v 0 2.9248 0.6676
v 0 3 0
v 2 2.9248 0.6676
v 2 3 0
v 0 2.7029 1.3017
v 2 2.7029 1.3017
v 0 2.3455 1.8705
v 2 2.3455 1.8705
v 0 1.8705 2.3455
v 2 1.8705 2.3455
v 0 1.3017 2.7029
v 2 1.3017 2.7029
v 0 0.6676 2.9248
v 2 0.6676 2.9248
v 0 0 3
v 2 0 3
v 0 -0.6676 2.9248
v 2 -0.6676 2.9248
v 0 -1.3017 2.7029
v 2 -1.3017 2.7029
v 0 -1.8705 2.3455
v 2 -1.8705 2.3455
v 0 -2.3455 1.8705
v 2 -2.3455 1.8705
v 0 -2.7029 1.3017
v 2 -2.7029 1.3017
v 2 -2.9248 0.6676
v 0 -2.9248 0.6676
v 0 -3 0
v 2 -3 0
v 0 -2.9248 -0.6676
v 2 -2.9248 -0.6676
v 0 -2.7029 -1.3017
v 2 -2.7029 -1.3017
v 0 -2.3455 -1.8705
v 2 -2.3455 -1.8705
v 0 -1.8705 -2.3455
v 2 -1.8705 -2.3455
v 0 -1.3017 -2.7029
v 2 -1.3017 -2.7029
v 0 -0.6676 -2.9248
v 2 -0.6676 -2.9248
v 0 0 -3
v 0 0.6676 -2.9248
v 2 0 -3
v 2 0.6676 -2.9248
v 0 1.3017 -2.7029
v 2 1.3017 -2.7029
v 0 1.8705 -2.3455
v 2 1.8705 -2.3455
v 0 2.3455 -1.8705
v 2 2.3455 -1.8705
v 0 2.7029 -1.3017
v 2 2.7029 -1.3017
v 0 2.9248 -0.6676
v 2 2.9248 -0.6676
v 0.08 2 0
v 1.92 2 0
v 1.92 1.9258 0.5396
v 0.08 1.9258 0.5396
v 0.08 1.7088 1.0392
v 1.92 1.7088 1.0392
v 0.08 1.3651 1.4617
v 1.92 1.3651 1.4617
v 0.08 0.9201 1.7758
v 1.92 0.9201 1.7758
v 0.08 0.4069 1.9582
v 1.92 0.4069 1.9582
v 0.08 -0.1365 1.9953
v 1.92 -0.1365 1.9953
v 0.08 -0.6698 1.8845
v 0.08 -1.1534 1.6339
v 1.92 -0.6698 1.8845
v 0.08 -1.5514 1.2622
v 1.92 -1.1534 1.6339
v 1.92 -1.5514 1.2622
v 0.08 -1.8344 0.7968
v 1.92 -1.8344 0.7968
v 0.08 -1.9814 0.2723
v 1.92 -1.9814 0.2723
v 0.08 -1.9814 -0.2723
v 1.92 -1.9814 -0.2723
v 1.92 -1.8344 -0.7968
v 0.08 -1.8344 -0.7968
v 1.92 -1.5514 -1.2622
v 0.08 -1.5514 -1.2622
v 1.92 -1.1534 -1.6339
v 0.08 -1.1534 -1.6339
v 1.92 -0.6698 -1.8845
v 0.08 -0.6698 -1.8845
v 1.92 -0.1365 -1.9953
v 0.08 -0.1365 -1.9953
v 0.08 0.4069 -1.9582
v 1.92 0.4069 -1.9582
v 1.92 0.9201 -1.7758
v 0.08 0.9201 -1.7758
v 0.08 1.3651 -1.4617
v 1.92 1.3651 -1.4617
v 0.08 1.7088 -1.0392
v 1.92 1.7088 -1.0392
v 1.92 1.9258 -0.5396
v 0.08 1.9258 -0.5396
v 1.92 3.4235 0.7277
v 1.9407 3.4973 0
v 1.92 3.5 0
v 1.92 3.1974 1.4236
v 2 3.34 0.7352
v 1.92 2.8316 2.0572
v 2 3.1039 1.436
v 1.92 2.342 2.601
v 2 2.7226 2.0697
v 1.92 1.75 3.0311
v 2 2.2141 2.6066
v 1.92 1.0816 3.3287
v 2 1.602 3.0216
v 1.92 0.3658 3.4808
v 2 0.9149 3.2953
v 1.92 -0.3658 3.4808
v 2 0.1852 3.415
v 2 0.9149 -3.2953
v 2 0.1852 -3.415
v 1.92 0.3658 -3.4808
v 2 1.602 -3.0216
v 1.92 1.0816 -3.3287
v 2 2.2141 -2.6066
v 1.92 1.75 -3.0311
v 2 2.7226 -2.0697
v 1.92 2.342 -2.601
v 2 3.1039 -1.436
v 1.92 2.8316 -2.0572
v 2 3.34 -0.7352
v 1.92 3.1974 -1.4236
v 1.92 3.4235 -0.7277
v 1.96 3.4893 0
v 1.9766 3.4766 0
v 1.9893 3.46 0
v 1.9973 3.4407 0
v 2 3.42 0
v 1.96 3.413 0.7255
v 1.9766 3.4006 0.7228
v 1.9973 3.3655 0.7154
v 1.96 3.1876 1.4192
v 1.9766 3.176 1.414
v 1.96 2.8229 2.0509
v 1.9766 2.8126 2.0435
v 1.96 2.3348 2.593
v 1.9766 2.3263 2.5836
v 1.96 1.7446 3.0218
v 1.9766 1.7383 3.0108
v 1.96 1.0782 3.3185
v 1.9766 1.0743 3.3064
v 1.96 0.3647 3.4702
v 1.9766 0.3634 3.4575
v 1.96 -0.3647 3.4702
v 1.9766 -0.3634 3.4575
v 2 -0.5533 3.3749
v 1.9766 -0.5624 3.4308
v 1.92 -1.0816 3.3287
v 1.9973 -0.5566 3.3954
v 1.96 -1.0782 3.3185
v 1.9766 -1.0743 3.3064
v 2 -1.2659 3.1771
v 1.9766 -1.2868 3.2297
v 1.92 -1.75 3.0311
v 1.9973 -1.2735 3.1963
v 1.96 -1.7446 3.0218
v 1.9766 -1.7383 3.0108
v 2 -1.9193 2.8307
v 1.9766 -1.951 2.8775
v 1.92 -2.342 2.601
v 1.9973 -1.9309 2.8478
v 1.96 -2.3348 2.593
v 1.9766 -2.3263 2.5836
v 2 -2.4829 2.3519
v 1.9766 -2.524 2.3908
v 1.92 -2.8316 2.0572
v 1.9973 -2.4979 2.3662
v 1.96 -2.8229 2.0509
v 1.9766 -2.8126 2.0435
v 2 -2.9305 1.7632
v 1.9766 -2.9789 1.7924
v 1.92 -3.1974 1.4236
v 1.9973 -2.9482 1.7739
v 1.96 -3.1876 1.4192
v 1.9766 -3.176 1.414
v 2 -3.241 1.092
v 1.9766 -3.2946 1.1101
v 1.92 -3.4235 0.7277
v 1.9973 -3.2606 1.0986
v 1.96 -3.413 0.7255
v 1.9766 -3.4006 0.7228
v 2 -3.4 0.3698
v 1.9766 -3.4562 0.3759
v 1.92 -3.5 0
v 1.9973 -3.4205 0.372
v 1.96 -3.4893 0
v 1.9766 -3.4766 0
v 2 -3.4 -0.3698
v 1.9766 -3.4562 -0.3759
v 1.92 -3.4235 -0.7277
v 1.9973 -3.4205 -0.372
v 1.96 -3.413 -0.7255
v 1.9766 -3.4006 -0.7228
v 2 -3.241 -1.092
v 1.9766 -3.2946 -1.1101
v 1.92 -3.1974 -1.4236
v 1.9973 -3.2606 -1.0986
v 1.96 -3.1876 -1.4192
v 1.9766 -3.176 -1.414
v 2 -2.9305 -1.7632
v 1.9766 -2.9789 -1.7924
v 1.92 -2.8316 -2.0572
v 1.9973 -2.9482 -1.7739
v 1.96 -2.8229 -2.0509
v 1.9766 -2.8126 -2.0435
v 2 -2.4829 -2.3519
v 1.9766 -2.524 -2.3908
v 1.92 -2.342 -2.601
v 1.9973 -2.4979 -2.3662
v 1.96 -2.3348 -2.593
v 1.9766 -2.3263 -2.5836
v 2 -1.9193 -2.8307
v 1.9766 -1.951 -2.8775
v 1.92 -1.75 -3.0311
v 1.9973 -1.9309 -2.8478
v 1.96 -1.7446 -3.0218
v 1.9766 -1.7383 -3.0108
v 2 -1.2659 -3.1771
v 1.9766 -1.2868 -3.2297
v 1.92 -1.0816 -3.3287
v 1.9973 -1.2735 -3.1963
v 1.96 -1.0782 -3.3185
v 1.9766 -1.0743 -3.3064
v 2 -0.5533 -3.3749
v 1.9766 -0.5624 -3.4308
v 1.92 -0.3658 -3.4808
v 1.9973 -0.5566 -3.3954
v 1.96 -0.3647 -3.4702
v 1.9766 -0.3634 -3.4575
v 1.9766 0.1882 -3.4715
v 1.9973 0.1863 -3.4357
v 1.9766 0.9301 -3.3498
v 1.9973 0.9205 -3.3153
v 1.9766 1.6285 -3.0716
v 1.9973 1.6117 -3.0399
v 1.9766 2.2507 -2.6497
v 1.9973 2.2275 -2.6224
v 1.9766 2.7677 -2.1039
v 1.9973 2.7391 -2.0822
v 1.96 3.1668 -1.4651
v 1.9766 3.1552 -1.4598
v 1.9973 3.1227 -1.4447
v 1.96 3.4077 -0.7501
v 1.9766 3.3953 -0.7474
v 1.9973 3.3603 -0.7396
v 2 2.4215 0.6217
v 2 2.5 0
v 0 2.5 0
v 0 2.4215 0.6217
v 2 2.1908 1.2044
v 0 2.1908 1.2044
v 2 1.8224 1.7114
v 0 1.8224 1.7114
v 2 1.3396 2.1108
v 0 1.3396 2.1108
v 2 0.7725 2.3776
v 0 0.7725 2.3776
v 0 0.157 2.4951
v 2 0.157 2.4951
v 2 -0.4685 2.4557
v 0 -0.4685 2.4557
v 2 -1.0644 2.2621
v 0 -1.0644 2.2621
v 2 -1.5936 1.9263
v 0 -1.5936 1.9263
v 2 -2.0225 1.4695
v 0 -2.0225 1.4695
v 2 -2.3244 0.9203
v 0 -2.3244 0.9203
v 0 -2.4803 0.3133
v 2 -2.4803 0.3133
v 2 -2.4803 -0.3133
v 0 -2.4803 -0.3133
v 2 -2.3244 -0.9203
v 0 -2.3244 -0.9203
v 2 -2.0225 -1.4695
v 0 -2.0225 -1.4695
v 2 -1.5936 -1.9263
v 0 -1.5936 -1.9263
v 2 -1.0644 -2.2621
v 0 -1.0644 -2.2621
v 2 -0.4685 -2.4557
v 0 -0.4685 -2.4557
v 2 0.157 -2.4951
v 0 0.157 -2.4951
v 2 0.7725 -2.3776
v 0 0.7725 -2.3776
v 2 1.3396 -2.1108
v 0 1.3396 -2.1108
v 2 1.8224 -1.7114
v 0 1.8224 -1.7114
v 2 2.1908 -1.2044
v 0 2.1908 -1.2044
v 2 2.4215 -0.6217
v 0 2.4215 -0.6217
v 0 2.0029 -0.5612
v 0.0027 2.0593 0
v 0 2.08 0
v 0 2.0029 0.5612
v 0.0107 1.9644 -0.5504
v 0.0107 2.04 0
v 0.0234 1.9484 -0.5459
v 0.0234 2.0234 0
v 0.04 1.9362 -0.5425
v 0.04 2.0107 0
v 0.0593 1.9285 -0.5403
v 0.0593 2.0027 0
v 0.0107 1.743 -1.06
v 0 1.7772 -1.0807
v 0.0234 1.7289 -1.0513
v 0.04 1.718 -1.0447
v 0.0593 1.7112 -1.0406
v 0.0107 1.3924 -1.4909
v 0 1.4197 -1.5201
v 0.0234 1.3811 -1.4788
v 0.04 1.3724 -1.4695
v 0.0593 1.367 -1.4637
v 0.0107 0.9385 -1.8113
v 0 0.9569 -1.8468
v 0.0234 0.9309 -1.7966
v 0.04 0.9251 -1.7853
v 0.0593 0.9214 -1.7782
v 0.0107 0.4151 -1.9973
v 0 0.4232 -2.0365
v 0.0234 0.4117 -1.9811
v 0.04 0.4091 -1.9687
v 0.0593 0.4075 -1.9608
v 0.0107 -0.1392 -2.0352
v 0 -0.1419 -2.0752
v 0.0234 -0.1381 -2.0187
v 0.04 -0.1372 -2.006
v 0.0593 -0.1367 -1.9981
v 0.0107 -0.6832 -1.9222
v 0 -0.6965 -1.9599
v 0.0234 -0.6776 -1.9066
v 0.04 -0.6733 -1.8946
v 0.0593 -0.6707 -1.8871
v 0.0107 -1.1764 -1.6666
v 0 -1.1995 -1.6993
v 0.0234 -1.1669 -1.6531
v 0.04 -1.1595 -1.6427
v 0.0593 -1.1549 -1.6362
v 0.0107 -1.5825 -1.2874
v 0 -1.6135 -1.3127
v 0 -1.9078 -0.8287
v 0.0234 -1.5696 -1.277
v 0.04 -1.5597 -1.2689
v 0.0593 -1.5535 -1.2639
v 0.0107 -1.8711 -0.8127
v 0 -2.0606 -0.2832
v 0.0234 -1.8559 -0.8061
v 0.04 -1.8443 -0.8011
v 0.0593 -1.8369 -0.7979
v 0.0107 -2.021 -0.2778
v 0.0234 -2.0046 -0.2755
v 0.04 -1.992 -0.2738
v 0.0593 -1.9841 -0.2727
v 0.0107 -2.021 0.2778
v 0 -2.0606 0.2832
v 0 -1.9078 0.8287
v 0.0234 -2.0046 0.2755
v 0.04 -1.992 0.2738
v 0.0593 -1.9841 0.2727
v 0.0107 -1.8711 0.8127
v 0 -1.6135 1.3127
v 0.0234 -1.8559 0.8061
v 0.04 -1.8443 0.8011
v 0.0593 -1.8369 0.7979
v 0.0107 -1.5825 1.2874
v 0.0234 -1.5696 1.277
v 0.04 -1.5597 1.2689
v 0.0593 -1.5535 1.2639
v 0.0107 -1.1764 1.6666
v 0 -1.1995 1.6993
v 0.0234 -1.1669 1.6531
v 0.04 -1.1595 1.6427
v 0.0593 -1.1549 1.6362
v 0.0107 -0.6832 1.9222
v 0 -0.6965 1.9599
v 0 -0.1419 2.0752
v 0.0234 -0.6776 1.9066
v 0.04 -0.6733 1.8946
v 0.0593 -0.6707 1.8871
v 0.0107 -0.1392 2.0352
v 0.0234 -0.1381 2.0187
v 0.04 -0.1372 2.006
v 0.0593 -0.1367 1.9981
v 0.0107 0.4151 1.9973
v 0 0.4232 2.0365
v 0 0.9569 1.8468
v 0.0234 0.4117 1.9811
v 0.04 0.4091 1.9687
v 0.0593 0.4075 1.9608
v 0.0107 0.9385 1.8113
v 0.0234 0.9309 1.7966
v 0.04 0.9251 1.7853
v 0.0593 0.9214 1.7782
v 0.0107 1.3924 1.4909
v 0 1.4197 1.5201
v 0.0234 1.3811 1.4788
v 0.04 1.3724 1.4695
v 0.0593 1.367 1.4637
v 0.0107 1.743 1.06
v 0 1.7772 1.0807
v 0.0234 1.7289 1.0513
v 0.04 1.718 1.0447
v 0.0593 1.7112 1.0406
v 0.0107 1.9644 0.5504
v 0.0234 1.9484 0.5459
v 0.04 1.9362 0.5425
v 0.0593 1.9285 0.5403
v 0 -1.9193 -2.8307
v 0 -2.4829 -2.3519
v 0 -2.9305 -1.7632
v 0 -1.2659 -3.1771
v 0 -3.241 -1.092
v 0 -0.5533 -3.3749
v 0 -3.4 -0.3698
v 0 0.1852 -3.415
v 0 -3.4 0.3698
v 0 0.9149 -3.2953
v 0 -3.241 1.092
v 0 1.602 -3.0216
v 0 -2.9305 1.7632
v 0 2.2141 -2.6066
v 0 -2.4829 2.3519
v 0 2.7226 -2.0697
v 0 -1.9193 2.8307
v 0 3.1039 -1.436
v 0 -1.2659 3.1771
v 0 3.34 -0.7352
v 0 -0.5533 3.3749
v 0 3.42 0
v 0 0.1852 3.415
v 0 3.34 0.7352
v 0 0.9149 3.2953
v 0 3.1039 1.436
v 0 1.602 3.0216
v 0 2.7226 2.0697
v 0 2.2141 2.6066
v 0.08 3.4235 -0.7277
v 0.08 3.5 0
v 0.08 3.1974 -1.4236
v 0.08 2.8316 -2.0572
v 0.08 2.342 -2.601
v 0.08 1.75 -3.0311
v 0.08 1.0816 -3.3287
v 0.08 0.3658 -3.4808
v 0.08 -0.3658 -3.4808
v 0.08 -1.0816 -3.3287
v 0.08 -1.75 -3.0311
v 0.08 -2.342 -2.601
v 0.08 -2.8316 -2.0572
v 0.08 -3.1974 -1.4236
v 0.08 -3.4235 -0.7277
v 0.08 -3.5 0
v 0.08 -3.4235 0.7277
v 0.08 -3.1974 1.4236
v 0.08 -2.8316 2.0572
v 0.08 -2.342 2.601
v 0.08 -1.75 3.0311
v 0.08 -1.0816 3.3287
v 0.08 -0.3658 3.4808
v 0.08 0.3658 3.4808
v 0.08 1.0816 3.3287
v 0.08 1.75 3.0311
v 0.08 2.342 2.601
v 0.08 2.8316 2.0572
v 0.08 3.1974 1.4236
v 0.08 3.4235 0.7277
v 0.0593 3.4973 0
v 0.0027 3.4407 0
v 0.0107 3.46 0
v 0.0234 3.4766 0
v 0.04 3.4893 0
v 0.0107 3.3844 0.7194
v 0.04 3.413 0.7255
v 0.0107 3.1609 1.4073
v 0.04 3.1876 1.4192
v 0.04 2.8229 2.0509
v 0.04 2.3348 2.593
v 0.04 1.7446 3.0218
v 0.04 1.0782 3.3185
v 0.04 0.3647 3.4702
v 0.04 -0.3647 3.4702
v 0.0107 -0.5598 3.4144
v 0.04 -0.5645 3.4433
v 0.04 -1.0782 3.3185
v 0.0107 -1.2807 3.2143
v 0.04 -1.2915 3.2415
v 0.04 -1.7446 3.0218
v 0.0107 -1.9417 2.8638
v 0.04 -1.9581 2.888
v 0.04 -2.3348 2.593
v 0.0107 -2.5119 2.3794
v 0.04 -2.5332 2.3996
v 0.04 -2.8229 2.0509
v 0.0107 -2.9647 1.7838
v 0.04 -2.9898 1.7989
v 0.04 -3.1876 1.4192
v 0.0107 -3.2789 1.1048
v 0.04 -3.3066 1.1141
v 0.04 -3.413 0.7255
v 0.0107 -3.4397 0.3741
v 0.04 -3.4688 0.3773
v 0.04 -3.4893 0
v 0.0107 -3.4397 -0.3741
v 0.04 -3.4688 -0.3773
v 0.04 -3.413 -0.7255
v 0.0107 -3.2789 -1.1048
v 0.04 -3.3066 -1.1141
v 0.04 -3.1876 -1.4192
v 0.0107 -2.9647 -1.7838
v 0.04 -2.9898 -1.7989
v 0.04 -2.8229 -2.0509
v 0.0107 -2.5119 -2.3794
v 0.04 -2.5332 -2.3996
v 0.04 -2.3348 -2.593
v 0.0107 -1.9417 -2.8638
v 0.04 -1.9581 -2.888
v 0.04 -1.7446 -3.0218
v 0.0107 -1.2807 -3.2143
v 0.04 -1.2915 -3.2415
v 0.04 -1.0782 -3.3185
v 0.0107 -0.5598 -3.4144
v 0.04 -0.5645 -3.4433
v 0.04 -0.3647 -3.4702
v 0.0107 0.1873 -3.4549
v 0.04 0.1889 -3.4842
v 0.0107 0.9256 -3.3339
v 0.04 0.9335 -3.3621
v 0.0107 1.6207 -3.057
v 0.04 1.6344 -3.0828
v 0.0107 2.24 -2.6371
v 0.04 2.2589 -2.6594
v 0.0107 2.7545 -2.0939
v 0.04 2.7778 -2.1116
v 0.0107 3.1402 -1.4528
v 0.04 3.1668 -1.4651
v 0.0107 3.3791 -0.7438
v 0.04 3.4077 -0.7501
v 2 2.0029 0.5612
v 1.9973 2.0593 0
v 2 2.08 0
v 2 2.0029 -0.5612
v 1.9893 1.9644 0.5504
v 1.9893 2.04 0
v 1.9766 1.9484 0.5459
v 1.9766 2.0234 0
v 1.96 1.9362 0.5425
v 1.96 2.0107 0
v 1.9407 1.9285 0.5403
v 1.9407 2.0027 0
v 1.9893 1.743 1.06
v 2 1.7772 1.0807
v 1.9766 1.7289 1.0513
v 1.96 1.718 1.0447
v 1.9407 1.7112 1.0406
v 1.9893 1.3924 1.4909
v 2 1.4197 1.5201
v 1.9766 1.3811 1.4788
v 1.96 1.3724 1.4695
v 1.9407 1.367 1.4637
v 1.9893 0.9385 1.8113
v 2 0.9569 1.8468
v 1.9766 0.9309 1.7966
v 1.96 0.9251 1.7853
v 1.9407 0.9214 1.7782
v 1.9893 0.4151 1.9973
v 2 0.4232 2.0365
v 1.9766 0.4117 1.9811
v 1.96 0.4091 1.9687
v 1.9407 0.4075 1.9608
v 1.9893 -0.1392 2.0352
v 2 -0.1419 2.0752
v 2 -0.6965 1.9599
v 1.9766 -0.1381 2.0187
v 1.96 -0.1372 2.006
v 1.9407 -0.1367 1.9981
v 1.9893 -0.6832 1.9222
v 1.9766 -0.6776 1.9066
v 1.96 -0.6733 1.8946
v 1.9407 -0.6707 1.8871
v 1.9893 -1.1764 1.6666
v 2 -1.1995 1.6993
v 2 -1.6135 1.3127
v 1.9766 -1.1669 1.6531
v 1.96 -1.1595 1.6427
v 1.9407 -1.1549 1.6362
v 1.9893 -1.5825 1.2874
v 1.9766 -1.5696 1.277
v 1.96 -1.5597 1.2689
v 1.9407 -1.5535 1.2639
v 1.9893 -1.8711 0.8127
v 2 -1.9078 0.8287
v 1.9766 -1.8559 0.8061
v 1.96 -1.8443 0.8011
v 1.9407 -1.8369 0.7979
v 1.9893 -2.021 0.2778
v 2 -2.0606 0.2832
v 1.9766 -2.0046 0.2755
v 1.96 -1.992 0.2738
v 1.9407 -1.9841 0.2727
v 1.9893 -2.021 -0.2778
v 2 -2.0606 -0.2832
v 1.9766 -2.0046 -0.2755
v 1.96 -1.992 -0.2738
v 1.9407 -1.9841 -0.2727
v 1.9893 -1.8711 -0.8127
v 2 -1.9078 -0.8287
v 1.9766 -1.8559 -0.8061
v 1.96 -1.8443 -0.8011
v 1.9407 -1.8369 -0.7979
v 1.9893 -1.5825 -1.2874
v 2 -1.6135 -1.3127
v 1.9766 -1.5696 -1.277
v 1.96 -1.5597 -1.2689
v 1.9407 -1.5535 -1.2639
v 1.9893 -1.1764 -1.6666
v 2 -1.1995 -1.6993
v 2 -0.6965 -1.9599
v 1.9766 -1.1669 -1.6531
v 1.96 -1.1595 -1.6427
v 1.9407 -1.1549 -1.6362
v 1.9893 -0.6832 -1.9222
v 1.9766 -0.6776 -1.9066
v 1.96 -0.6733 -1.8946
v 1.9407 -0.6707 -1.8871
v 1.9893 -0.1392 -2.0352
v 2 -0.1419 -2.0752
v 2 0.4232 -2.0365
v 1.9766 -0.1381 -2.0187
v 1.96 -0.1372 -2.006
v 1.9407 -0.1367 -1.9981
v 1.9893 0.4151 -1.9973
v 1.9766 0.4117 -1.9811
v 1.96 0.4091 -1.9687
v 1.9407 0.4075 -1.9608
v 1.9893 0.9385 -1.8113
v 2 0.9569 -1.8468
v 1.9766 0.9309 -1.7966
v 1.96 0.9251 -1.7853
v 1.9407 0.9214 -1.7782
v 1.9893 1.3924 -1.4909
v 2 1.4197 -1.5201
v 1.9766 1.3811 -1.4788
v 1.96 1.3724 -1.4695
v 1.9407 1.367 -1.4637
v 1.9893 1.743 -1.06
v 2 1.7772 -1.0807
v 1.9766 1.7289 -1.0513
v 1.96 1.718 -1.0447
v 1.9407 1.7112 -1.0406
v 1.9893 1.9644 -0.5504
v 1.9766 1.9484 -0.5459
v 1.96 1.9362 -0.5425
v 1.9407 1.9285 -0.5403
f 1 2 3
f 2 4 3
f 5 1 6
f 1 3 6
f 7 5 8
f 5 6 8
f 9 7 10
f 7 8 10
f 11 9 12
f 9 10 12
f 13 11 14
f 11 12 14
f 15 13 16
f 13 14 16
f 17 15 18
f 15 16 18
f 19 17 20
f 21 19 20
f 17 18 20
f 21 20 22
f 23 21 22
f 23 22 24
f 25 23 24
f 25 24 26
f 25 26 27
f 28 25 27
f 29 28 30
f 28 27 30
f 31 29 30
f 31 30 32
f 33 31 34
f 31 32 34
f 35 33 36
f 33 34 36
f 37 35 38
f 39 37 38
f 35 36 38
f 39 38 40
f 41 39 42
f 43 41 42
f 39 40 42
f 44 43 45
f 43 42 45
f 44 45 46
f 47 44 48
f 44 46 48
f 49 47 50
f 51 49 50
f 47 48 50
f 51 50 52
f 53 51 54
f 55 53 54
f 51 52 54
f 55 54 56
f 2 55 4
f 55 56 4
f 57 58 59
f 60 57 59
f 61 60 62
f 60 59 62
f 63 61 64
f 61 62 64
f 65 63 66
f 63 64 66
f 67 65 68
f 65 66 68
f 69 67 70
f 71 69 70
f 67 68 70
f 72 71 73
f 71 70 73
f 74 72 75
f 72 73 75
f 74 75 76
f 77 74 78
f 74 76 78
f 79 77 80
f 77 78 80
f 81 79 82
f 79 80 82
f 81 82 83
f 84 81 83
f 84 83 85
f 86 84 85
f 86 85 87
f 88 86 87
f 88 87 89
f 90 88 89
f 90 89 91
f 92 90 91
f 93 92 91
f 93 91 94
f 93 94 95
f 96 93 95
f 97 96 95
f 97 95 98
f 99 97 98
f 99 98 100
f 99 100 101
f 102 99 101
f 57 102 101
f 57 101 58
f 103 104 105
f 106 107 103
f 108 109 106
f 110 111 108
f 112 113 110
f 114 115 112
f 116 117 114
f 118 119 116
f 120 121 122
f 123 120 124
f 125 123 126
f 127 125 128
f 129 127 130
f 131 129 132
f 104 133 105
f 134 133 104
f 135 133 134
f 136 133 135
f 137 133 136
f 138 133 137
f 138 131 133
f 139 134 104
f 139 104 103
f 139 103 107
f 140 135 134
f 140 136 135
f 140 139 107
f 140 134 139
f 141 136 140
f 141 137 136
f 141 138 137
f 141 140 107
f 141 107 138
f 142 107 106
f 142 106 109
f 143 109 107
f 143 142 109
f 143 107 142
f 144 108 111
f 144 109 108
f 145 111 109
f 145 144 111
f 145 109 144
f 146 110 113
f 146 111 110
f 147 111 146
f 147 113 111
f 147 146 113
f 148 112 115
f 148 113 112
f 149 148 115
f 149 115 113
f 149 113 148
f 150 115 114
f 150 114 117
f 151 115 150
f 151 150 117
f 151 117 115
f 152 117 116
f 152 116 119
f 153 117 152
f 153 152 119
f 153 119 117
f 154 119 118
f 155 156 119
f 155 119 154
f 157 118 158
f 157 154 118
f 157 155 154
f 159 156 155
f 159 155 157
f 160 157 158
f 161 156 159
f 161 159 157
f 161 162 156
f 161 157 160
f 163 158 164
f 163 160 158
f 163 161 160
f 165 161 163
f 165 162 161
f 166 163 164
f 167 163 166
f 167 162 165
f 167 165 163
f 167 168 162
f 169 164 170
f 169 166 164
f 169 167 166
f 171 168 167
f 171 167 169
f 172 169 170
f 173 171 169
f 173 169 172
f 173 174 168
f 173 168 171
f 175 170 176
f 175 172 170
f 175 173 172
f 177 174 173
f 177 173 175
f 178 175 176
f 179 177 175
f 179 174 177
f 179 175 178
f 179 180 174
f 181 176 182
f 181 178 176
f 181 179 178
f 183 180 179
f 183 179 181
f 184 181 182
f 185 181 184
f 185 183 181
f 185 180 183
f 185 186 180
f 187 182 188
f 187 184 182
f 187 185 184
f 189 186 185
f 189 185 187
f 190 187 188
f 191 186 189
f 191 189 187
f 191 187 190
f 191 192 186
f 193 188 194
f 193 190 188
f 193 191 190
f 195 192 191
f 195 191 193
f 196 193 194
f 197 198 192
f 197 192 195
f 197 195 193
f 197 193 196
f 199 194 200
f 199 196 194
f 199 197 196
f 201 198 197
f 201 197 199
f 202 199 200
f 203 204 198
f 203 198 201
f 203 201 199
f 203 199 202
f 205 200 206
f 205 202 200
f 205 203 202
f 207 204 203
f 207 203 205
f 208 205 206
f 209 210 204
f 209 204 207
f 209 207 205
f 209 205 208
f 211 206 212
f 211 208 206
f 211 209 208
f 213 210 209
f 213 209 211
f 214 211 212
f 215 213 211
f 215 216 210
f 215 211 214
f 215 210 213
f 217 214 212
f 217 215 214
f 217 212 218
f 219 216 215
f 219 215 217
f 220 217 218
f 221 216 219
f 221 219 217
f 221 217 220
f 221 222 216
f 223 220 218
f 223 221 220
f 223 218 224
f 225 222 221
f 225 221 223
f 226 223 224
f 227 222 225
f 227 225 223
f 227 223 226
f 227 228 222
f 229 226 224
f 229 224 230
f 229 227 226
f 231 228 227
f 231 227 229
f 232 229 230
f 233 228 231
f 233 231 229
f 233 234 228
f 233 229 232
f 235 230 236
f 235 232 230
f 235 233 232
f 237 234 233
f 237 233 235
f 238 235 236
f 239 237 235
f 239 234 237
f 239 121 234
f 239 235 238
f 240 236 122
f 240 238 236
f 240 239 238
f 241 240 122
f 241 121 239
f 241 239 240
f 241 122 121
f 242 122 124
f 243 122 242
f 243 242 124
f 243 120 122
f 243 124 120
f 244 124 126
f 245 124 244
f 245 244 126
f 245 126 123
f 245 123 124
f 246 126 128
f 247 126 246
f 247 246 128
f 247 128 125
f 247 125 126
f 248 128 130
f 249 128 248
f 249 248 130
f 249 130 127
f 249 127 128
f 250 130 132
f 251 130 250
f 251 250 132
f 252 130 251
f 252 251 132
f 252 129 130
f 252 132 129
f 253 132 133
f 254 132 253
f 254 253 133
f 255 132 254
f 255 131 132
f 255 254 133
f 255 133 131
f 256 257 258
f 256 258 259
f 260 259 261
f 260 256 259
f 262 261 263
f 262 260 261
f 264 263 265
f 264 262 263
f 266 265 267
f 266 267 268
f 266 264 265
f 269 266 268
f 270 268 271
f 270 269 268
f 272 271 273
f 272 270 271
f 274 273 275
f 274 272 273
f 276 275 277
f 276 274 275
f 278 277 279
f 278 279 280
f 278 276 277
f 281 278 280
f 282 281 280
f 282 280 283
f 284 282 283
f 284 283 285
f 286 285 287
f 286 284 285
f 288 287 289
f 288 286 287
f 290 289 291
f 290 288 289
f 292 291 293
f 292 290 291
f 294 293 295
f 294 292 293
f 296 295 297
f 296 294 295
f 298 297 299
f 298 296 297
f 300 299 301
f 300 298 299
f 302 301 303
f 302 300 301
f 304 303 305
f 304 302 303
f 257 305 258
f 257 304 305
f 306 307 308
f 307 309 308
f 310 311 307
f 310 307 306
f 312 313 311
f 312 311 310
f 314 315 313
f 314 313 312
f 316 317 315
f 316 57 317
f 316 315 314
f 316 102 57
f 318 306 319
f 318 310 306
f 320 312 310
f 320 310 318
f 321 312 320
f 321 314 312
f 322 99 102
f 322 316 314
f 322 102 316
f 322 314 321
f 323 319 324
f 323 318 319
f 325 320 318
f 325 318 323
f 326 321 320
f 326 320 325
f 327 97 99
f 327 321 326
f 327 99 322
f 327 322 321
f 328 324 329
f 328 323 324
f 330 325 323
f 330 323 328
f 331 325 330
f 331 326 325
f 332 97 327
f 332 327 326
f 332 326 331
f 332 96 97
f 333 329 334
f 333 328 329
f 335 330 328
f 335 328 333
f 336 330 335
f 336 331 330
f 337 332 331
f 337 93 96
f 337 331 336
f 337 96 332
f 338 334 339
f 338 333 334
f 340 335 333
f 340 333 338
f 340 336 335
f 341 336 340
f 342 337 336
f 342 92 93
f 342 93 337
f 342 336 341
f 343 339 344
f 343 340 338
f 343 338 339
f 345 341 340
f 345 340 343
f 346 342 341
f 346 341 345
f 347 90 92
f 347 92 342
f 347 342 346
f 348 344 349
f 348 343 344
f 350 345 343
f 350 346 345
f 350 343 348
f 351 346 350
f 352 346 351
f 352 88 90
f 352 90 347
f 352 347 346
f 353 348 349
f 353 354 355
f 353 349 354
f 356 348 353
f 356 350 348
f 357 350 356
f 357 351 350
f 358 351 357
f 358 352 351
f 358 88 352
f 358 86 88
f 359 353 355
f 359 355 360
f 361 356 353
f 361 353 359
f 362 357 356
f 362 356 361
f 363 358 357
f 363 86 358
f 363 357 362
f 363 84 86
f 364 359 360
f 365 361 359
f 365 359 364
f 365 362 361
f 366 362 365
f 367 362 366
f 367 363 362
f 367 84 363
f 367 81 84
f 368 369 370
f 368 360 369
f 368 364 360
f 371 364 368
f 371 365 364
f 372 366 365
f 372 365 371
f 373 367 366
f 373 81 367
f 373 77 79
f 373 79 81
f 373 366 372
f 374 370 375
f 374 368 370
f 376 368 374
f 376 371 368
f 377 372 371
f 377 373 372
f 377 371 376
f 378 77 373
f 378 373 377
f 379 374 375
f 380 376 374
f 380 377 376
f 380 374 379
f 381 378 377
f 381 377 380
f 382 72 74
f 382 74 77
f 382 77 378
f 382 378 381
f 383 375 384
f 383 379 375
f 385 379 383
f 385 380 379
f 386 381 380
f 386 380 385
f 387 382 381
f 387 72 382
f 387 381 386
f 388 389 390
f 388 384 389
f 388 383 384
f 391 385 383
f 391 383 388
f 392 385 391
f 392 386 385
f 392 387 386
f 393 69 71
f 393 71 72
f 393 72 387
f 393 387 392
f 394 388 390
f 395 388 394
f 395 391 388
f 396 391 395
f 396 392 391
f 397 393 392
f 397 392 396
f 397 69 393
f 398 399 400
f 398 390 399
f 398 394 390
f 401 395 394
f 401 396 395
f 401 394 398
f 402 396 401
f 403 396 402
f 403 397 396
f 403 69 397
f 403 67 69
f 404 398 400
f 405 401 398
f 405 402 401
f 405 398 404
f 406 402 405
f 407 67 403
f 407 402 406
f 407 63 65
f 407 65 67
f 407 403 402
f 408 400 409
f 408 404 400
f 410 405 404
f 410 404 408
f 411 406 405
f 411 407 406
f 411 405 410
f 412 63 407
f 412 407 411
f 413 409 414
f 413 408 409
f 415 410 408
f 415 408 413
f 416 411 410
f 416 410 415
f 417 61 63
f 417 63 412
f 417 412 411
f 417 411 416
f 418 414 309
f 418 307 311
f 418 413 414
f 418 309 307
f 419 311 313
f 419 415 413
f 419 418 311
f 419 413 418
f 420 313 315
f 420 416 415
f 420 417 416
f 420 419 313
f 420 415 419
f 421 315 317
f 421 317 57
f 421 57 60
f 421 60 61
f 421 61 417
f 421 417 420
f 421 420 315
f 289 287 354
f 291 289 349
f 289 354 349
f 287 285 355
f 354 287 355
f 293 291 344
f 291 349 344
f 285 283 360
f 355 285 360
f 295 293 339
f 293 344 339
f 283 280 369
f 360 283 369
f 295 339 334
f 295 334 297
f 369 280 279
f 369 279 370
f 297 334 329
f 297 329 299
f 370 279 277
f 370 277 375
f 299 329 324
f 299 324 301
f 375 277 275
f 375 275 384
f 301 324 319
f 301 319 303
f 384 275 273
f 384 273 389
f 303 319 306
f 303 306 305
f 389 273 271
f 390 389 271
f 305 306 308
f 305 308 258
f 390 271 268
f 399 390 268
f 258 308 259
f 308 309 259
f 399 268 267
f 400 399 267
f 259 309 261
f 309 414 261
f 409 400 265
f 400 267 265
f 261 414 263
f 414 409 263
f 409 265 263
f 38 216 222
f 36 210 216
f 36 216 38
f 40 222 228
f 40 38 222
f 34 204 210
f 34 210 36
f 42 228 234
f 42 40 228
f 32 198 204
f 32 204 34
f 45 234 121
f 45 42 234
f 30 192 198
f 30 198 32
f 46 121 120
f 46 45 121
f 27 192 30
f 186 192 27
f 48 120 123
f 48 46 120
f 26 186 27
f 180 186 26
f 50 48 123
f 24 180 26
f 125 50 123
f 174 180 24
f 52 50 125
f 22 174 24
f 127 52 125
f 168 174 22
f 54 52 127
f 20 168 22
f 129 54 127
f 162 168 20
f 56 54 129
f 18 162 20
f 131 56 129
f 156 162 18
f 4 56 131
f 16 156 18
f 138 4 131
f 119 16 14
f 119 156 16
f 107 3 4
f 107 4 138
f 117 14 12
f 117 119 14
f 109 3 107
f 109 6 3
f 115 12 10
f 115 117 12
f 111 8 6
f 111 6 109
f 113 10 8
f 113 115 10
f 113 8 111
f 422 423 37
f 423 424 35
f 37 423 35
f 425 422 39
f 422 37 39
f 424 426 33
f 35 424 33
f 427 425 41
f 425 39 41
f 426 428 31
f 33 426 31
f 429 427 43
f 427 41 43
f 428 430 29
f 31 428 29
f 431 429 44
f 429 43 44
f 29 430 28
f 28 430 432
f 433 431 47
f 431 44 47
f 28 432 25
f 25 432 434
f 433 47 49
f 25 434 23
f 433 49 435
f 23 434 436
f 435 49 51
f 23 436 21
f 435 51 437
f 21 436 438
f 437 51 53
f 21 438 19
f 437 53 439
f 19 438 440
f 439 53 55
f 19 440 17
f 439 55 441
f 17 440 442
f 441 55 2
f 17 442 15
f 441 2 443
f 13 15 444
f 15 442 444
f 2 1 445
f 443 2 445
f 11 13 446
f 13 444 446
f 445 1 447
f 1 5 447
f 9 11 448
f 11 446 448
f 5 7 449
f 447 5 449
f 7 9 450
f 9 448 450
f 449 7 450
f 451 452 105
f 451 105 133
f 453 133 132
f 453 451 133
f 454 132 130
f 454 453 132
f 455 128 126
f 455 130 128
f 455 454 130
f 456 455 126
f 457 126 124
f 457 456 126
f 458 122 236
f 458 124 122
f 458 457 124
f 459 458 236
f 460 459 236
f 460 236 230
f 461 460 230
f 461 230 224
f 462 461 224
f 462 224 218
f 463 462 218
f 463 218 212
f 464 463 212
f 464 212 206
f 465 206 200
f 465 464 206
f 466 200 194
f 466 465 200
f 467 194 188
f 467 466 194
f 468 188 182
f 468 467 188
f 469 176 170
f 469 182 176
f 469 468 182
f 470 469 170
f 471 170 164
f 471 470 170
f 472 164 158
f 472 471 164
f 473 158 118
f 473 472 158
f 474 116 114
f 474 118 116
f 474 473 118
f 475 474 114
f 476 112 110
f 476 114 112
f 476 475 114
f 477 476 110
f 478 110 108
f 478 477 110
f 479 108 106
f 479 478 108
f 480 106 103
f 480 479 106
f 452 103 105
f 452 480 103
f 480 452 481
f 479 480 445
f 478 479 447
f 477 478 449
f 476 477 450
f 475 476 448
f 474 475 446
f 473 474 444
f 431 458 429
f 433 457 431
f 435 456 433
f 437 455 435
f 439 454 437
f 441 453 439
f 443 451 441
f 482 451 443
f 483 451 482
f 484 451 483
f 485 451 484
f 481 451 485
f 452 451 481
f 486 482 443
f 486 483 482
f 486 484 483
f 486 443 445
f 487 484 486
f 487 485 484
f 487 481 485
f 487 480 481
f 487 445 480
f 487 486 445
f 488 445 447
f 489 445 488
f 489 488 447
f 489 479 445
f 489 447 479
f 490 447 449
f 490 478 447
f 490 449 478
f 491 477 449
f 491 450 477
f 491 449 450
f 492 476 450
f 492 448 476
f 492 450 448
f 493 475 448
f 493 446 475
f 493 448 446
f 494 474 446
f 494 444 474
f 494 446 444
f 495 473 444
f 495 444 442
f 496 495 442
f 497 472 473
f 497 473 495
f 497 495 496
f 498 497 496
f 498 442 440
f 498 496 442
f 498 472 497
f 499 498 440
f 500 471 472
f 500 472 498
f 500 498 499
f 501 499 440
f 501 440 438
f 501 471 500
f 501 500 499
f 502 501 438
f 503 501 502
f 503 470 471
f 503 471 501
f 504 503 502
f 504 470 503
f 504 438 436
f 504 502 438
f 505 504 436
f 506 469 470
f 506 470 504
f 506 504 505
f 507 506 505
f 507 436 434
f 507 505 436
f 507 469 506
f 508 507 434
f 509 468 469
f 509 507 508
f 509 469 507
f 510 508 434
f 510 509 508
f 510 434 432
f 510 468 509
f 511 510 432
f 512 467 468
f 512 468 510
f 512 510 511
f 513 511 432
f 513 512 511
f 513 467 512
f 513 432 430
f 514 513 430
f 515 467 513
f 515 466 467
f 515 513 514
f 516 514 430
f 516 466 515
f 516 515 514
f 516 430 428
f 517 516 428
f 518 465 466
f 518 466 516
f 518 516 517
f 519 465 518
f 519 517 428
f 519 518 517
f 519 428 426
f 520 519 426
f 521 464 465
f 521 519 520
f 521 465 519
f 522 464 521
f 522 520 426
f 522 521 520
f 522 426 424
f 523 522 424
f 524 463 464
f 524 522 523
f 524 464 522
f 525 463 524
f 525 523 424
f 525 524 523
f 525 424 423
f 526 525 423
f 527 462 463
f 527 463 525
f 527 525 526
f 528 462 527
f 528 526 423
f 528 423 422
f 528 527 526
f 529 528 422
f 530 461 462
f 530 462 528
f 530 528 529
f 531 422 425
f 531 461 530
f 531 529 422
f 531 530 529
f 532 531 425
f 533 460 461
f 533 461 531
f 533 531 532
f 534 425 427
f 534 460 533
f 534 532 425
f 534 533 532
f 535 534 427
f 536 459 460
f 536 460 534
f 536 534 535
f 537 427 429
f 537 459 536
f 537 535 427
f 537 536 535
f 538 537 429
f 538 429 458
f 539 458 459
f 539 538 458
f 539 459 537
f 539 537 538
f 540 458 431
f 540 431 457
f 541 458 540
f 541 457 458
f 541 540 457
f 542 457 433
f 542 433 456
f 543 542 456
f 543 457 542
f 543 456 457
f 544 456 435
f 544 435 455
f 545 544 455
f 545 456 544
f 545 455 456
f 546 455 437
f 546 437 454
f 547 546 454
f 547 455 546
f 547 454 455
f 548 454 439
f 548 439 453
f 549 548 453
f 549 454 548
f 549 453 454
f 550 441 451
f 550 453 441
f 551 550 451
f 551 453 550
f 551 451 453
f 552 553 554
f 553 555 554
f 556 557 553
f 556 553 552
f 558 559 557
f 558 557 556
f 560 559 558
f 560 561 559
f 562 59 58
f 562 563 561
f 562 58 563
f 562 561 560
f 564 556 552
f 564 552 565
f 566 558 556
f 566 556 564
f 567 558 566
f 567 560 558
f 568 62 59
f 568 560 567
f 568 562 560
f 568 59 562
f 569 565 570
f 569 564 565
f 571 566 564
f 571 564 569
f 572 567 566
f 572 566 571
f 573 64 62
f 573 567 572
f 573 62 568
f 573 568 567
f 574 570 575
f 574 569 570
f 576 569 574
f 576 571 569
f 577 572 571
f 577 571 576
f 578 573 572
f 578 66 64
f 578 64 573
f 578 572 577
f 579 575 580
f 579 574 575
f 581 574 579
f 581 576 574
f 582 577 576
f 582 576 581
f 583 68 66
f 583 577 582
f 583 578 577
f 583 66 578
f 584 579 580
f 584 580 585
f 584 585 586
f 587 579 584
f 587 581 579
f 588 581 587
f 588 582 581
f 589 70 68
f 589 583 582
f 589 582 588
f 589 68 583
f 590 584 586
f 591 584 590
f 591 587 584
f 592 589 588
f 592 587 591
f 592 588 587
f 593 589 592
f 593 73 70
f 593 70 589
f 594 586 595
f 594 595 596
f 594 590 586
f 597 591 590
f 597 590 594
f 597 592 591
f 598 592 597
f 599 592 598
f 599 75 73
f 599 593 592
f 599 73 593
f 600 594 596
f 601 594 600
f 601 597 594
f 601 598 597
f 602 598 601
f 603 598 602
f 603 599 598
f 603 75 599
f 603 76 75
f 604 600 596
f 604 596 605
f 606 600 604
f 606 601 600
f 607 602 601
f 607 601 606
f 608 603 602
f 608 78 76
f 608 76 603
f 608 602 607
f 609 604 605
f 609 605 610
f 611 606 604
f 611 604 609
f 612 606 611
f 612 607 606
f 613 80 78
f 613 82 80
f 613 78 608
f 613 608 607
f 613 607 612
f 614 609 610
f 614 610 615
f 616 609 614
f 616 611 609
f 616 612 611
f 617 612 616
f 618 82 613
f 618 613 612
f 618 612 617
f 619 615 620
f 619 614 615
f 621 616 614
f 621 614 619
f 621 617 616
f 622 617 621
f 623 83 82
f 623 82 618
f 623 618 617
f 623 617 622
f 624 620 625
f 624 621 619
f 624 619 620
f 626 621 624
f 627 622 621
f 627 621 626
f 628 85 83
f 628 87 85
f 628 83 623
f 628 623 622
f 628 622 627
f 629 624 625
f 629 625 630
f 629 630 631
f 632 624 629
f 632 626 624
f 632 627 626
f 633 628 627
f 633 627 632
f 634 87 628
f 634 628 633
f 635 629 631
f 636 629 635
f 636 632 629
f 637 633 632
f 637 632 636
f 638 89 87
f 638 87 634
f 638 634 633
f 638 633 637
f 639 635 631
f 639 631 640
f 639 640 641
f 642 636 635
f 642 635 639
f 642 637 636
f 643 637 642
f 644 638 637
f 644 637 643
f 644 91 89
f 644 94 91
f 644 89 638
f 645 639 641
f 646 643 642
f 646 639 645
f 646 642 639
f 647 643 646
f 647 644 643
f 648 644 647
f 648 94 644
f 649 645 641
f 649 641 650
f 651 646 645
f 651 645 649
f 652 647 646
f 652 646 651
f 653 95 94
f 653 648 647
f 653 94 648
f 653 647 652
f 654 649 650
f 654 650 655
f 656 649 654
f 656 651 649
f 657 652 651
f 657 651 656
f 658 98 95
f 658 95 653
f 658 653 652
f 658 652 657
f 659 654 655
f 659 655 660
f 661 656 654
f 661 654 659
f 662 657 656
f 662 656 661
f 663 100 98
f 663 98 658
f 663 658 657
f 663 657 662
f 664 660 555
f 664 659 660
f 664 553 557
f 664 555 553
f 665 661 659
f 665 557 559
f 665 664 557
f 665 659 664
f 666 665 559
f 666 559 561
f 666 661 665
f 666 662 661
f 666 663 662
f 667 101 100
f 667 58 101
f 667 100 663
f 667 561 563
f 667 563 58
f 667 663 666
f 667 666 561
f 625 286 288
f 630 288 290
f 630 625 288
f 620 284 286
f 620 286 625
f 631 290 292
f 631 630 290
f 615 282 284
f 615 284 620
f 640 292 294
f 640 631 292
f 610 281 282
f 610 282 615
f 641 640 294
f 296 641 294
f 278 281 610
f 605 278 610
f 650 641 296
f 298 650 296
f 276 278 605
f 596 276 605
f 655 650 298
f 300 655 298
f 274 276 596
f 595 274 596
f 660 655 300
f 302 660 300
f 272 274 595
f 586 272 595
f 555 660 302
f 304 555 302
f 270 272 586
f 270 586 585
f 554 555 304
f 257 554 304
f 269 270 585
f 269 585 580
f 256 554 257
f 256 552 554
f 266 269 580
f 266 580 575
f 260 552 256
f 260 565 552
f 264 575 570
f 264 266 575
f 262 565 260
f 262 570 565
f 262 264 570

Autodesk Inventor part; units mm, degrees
ref_plane "YZ Plane" through (0, 0, 0) normal (1, 0, 0) x (0, 1, 0)
ref_plane "XZ Plane" through (0, 0, 0) normal (0, 1, 0) x (-1, 0, 0)
ref_plane "XY Plane" through (0, 0, 0) normal (0, 0, 1) x (1, 0, 0)
sketch "Sketch" plane through (0, 0, 0) normal (0, 0, 1) x (1, 0, 0)
  line L0 (0, 0) -> (2, 0)
  line L1 (0, 0) -> (0, 2) construction
  line L2 (0, 2) -> (2, 2)
  line L3 (2, 2) -> (2, 3.5)
  line L4 (2, 3.5) -> (0, 3.5)
  line L5 (0, 3.5) -> (0, 2)
  line L6 (0, 2.75) -> (2, 2.75)
  line L7 (0, 3) -> (2, 3)
  line L8 (0, 2.5) -> (2, 2.5)
  dimension "d0" = 2
  dimension "d1" = 4
  dimension "d2" = 5
  dimension "d3" = 7
revolve "Body" add sketch "Sketch" angle 360 about axis through (0, 0, 0) along (1, 0, 0) contours L5 L8 L3 L2 | L5 L4 L3 L7
fillet "Fillet1" radius 0.08 4 edges at (0, -3.5, 0) (2, -3.5, 0) (0, -2, 0) (2, -2, 0)
equation "\"d0\" = KB"
equation "\"d1\" = WD"
equation "\"d2\" = 0.333333 * BD + 0.666667 * WD"
equation "\"d3\" = BD"
equation "\"d5\" = KRS"
equation "\"WD\" = 4"
equation "\"BD\" = 7"
equation "\"KB\" = 2"
equation "\"KRS\" = 0.08"
equation "\"BBA\" = 0"
equation "\"KR1S\" = 0.05"
equation "\"BR\" = 0.5 * BD"
equation "\"WR\" = 0.5 * WD"
properties part number "ISO 1224-1 - 17 - 4 x 7 x 2" material "Steel, Mild"
